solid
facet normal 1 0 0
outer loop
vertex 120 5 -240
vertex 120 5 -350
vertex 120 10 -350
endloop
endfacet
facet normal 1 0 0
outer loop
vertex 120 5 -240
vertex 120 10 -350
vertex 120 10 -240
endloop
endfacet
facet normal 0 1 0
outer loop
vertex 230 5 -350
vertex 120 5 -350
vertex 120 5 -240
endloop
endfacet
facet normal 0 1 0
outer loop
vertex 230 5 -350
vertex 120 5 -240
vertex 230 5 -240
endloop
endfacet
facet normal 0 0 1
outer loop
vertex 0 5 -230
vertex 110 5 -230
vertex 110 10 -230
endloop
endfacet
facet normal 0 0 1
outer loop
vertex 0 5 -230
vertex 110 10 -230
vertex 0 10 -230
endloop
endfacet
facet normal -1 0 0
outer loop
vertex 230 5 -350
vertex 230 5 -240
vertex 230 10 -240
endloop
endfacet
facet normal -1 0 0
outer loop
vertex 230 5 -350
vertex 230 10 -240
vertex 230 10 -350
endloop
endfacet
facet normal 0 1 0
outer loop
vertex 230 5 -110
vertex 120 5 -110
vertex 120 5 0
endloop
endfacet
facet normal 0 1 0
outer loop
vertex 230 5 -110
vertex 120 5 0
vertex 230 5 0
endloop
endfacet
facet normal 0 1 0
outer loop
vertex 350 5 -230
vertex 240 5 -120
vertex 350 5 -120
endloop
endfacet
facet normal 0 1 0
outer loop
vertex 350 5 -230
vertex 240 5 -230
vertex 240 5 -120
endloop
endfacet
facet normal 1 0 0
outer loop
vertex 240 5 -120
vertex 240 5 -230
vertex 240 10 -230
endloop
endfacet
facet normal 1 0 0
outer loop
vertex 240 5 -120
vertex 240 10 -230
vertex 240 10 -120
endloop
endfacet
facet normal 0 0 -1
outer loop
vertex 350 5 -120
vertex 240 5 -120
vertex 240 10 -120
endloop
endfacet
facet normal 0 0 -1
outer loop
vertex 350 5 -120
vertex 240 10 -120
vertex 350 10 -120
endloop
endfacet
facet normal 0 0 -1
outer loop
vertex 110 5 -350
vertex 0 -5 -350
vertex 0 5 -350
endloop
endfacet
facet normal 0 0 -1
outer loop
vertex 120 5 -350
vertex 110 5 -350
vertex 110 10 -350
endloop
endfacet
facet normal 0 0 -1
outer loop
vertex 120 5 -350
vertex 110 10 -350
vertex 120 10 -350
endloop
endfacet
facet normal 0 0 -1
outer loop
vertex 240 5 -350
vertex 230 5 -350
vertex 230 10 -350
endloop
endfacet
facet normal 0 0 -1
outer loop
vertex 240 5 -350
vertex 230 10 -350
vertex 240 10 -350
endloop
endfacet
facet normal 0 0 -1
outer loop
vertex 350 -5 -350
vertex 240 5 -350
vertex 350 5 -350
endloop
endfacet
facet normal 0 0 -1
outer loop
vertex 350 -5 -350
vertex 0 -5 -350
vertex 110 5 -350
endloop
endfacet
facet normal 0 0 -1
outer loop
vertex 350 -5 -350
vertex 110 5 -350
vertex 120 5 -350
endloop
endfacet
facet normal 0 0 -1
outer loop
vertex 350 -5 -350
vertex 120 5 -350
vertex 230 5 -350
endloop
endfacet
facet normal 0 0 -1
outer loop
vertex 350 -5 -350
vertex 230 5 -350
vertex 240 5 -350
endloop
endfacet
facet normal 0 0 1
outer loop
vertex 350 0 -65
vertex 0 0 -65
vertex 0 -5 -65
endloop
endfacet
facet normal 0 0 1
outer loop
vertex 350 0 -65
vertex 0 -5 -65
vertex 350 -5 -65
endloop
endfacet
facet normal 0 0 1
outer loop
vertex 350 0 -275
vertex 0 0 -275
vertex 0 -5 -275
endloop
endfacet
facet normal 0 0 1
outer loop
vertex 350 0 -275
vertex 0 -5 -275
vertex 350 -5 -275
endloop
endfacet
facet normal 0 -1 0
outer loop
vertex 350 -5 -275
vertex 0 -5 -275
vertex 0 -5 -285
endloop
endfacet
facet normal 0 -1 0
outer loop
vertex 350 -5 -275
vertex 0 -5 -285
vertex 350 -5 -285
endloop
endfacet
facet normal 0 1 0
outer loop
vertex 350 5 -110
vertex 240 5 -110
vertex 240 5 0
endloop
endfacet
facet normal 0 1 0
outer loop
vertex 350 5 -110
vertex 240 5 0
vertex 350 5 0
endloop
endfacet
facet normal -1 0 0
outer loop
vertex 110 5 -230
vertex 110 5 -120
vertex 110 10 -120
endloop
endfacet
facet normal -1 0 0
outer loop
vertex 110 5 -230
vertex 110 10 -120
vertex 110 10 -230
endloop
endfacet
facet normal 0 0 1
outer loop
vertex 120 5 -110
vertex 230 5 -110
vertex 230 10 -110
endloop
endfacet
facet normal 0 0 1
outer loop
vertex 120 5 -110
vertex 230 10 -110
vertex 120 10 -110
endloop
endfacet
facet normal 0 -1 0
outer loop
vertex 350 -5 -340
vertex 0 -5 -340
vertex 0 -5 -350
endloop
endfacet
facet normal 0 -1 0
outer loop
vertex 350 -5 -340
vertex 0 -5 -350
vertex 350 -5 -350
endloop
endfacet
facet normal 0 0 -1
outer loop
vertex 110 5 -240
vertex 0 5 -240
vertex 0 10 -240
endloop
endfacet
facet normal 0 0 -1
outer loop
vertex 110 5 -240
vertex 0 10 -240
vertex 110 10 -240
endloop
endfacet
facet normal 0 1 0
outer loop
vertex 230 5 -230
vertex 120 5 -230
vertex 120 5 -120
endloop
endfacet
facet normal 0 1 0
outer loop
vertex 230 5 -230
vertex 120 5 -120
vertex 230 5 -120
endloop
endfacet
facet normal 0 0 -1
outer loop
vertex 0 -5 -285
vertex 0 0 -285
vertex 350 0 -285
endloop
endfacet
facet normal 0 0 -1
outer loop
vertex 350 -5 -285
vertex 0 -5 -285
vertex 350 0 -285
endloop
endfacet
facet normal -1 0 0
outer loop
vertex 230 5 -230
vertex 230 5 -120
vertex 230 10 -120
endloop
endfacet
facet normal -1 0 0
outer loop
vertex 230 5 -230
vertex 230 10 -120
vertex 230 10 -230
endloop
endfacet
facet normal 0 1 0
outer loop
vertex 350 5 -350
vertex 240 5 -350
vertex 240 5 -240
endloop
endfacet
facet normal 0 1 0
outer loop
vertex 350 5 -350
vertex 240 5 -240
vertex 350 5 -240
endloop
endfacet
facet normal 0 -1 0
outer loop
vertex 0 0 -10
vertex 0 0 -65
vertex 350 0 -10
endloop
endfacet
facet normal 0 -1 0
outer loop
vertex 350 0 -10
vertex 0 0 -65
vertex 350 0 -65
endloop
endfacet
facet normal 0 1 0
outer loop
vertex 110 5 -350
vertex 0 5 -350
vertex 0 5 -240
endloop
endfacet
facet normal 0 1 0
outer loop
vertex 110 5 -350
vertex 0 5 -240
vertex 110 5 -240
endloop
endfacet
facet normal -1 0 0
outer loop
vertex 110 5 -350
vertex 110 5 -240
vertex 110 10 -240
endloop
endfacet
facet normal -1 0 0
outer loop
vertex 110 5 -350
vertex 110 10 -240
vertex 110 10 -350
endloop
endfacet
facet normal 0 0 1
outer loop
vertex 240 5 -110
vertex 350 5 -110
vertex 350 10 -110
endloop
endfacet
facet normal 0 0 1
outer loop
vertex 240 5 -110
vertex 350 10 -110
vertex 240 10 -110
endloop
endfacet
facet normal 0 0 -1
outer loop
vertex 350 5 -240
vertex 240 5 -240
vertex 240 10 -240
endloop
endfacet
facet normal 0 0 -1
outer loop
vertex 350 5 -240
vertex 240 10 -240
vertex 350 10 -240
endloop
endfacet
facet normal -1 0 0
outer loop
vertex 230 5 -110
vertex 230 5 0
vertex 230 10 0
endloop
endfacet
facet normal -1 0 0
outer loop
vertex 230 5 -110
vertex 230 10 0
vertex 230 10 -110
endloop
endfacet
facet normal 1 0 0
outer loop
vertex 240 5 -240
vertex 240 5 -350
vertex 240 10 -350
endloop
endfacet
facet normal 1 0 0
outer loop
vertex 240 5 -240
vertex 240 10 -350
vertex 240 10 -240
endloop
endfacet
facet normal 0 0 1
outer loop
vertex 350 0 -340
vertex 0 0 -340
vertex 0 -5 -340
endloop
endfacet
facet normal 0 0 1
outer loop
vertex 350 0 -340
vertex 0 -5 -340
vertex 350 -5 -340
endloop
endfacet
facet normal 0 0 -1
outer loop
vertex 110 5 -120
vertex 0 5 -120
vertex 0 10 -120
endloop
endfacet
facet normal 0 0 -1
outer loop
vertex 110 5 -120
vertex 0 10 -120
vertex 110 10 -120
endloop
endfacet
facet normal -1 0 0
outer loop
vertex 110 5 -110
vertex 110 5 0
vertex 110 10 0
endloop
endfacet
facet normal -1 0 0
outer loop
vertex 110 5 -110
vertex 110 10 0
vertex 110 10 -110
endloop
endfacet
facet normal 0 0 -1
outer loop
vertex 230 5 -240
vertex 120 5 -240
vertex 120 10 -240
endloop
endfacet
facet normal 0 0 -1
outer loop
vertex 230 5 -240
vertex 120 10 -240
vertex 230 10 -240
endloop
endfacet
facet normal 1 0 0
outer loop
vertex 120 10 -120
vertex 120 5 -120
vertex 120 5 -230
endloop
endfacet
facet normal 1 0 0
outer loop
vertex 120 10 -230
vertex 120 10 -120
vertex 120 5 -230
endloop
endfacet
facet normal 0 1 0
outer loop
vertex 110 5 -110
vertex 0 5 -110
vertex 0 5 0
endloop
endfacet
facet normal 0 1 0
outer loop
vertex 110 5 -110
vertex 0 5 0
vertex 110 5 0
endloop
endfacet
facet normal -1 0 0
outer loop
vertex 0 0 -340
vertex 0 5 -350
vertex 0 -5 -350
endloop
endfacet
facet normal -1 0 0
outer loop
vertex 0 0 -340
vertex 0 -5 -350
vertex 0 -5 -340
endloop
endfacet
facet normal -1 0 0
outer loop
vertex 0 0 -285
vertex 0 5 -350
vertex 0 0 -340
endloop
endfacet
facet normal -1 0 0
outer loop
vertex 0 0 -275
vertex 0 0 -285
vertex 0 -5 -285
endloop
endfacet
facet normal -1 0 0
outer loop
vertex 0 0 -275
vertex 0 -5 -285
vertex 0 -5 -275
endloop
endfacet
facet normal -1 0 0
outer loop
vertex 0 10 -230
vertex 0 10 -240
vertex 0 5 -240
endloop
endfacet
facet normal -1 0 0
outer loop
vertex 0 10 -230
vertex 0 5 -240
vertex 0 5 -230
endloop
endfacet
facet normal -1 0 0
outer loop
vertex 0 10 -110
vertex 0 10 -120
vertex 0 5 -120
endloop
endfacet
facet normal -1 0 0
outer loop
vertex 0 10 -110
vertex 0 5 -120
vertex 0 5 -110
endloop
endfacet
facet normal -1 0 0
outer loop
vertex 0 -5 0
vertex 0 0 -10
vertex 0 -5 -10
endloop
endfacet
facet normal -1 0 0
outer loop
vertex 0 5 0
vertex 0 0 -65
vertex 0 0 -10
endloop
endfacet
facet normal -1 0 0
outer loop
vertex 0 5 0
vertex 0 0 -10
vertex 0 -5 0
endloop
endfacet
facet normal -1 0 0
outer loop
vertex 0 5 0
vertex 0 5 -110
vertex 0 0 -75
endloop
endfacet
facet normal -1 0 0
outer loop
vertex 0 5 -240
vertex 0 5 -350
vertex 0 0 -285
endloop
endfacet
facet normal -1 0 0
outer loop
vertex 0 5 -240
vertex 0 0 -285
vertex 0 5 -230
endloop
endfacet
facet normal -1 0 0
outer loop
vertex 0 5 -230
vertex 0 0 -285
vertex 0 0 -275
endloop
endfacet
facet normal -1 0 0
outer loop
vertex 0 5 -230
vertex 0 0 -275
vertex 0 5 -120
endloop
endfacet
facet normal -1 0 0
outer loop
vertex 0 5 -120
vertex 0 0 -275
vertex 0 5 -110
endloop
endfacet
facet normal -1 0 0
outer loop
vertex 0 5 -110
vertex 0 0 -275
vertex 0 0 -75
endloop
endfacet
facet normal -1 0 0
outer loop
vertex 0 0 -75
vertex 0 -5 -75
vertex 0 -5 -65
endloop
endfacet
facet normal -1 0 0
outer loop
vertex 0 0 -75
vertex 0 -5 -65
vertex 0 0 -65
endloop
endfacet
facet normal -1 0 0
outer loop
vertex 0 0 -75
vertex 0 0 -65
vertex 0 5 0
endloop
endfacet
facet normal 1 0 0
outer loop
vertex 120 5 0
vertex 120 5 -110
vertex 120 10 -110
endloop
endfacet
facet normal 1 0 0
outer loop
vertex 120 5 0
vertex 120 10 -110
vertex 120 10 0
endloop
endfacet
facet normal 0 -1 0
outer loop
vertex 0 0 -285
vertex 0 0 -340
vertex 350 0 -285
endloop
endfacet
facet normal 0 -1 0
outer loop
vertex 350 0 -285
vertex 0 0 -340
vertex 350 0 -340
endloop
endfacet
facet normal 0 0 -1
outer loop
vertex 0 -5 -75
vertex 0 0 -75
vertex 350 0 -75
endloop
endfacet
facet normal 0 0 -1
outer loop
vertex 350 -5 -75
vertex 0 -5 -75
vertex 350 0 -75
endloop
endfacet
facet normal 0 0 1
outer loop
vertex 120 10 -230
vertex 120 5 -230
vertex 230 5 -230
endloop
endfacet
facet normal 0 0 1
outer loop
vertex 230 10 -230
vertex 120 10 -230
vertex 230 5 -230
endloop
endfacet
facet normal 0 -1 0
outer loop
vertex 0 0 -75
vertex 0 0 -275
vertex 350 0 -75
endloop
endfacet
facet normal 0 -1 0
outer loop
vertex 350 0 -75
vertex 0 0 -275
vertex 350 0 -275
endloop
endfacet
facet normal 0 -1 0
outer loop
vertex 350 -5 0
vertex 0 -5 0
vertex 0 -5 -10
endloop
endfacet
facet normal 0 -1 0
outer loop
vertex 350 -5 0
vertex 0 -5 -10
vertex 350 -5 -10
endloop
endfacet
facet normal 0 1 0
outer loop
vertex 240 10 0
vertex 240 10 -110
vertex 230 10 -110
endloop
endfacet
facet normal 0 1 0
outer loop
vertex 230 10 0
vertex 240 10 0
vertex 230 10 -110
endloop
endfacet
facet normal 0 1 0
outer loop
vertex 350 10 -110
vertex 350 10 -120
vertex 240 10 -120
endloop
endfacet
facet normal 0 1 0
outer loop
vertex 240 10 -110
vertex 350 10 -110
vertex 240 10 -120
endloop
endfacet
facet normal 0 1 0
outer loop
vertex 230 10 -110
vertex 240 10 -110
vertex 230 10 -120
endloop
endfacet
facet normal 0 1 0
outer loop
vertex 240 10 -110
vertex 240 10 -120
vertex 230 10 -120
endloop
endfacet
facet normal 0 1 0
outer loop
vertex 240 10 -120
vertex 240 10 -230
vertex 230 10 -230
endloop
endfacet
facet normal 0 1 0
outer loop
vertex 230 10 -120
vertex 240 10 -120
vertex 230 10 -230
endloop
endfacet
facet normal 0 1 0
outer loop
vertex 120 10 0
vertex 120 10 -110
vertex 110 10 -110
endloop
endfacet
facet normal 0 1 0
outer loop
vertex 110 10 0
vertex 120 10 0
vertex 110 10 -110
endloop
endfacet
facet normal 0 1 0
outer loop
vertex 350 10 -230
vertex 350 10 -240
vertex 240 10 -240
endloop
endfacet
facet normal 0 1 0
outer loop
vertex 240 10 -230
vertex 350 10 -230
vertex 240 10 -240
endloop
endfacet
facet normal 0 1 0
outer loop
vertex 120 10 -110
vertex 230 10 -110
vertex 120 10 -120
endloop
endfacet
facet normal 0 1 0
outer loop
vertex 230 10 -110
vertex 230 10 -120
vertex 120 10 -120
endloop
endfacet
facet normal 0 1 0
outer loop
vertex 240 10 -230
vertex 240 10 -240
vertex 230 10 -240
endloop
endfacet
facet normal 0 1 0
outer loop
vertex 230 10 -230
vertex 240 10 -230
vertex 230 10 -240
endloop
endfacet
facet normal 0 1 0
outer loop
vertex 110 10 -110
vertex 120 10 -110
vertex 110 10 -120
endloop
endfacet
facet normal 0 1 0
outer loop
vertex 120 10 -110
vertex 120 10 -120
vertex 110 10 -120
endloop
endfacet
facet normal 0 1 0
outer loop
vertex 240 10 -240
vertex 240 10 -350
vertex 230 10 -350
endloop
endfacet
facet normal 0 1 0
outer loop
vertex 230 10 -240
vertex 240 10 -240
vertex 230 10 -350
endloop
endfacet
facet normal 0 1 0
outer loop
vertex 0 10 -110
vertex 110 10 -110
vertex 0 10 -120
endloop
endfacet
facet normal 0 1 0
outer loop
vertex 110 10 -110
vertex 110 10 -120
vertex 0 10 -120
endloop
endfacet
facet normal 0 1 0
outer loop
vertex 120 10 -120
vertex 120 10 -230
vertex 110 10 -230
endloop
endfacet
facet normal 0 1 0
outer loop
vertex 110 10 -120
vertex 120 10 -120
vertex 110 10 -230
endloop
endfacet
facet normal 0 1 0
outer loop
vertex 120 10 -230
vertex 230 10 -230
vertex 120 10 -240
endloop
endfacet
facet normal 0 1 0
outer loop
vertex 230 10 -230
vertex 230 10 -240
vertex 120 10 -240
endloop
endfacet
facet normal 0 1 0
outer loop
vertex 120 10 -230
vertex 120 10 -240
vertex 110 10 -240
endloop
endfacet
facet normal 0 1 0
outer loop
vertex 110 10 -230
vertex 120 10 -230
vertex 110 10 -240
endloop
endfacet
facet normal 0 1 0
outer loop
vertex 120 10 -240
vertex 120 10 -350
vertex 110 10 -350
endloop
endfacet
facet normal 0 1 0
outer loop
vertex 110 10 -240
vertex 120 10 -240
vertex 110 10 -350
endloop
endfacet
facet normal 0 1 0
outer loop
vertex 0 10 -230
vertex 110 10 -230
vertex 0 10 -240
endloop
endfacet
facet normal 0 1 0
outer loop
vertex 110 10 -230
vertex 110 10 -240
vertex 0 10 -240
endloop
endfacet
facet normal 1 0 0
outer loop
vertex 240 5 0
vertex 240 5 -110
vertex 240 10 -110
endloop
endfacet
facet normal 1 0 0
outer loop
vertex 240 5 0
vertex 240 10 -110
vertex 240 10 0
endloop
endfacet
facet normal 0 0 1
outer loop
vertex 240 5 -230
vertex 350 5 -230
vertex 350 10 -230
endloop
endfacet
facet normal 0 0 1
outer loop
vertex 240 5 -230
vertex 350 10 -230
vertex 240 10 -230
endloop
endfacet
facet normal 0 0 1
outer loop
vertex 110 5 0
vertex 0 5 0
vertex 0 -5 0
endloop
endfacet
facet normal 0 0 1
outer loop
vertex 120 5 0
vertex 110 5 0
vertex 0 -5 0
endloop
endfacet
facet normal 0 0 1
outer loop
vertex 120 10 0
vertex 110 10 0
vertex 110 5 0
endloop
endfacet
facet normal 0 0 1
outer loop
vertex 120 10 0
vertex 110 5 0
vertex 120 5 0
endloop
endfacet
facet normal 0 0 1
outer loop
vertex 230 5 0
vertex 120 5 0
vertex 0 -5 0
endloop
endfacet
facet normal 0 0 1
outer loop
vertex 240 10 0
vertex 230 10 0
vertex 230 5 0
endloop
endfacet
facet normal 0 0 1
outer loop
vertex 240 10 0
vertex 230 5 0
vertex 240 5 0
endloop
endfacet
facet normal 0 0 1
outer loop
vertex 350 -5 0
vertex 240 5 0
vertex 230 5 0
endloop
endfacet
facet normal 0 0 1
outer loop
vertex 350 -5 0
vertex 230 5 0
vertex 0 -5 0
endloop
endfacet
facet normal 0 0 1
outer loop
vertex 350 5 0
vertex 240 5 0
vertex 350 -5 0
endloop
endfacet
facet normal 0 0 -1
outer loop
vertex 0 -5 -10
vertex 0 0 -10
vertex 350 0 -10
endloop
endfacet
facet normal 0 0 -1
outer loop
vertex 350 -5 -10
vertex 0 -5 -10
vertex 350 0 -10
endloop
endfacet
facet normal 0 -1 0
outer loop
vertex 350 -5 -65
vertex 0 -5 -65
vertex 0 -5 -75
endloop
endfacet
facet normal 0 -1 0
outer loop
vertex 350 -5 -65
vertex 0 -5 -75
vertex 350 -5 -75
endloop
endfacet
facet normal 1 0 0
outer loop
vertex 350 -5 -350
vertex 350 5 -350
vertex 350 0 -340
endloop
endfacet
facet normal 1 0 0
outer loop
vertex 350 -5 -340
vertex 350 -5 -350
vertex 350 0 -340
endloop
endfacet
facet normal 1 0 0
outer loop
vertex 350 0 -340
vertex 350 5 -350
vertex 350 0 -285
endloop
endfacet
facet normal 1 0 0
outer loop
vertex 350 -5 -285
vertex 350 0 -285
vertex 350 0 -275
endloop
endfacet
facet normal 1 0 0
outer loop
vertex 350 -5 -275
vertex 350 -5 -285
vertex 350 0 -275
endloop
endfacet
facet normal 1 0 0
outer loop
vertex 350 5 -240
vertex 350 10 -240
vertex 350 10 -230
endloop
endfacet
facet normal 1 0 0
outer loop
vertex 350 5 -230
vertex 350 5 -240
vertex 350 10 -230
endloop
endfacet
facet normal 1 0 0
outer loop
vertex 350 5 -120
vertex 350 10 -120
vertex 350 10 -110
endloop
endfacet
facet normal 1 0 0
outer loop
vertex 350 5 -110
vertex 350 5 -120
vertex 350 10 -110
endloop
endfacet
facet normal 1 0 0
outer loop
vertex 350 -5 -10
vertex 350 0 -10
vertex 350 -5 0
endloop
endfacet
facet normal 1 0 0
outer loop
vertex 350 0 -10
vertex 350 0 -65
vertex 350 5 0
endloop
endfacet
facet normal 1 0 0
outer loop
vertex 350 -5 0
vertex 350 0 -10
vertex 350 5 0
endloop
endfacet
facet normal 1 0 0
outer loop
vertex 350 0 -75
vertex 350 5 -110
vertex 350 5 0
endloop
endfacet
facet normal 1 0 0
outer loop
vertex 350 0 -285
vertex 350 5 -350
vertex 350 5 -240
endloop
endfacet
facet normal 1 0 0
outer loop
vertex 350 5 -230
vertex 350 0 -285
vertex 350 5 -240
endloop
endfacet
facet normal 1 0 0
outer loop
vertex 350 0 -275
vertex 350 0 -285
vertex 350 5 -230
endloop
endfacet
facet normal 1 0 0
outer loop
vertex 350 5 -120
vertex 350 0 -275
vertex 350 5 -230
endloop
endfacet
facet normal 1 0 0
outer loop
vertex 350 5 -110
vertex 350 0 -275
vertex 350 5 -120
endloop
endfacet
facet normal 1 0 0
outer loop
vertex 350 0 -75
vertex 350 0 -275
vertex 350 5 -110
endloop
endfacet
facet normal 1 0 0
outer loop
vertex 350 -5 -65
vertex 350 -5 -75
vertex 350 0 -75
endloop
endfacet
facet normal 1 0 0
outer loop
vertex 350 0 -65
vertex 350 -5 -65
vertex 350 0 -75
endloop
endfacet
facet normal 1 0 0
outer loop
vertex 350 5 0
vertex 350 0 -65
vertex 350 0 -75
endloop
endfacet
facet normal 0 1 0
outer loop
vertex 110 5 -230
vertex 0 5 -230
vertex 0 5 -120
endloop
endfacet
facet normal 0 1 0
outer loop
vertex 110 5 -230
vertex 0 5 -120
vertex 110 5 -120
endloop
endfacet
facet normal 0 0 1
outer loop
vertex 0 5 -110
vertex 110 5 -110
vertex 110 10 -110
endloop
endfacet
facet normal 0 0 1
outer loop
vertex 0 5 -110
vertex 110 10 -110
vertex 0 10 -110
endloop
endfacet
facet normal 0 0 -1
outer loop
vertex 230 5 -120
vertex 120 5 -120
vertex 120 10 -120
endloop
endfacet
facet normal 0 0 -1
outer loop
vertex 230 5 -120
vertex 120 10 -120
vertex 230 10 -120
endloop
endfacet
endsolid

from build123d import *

# Parameters (mm, degrees)
CROQUIS1_W              = 350
CROQUIS1_H              = 350
SALIENTE_EXTRUIR1_DEPTH = 5
CROQUIS2_W              = 350
CROQUIS2_H              = 10
SALIENTE_EXTRUIR2_DEPTH = 5
CROQUIS3_W              = 110
CROQUIS3_H              = 110
SALIENTE_EXTRUIR3_DEPTH = 5


with BuildPart() as part:
    # Croquis1 → Saliente-Extruir1 (new body)
    with BuildSketch(Plane(origin=(0, 0, 0), x_dir=(1, 0, 0), z_dir=(0, 1, 0))):
        with Locations((175, 175)):
            Rectangle(CROQUIS1_W, CROQUIS1_H)
    extrude(amount=SALIENTE_EXTRUIR1_DEPTH)

    # Croquis2 → Saliente-Extruir2 (add)
    with BuildSketch(Plane.XZ):
        with Locations((175, -5)):
            Rectangle(CROQUIS2_W, CROQUIS2_H)
        with Locations((175, -345)):
            Rectangle(CROQUIS2_W, CROQUIS2_H)
        with Locations((175, -70)):
            Rectangle(CROQUIS2_W, CROQUIS2_H)
        with Locations((175, -280)):
            Rectangle(CROQUIS2_W, CROQUIS2_H)
    extrude(amount=SALIENTE_EXTRUIR2_DEPTH)

    # Croquis3 → Saliente-Extruir3 (add)
    with BuildSketch(Plane(origin=(0, 5, 0), x_dir=(1, 0, 0), z_dir=(0, 1, 0))):
        Polygon((110, 350), (120, 350), (120, 240), (230, 240), (230, 350), (240, 350), (240, 240), (350, 240), (350, 230), (240, 230), (240, 120), (350, 120), (350, 110), (240, 110), (240, 0), (230, 0), (230, 110), (120, 110), (120, 0), (110, 0), (110, 110), (0, 110), (0, 120), (110, 120), (110, 230), (0, 230), (0, 240), (110, 240), align=None)
        with Locations((175, 175)):
            Rectangle(CROQUIS3_W, CROQUIS3_H, mode=Mode.SUBTRACT)
    extrude(amount=SALIENTE_EXTRUIR3_DEPTH)


solid = part.part
